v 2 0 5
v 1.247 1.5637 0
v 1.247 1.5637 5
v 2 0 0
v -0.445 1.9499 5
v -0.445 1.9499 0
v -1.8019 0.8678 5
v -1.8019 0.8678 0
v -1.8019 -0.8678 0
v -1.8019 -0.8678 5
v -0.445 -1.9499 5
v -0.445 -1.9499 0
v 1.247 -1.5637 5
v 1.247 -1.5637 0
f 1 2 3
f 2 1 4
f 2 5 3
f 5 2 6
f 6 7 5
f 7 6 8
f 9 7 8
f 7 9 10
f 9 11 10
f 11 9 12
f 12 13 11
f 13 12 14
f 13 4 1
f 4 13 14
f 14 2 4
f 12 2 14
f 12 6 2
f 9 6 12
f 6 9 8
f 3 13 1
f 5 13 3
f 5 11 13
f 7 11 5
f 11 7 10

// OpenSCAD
// modifier characters: # % ! *
#cube([5, 5, 5]);
%translate([10, 0, 0]) sphere(3);
!cylinder(h=5, r=2);
*translate([0, 10, 0]) cube(2);
